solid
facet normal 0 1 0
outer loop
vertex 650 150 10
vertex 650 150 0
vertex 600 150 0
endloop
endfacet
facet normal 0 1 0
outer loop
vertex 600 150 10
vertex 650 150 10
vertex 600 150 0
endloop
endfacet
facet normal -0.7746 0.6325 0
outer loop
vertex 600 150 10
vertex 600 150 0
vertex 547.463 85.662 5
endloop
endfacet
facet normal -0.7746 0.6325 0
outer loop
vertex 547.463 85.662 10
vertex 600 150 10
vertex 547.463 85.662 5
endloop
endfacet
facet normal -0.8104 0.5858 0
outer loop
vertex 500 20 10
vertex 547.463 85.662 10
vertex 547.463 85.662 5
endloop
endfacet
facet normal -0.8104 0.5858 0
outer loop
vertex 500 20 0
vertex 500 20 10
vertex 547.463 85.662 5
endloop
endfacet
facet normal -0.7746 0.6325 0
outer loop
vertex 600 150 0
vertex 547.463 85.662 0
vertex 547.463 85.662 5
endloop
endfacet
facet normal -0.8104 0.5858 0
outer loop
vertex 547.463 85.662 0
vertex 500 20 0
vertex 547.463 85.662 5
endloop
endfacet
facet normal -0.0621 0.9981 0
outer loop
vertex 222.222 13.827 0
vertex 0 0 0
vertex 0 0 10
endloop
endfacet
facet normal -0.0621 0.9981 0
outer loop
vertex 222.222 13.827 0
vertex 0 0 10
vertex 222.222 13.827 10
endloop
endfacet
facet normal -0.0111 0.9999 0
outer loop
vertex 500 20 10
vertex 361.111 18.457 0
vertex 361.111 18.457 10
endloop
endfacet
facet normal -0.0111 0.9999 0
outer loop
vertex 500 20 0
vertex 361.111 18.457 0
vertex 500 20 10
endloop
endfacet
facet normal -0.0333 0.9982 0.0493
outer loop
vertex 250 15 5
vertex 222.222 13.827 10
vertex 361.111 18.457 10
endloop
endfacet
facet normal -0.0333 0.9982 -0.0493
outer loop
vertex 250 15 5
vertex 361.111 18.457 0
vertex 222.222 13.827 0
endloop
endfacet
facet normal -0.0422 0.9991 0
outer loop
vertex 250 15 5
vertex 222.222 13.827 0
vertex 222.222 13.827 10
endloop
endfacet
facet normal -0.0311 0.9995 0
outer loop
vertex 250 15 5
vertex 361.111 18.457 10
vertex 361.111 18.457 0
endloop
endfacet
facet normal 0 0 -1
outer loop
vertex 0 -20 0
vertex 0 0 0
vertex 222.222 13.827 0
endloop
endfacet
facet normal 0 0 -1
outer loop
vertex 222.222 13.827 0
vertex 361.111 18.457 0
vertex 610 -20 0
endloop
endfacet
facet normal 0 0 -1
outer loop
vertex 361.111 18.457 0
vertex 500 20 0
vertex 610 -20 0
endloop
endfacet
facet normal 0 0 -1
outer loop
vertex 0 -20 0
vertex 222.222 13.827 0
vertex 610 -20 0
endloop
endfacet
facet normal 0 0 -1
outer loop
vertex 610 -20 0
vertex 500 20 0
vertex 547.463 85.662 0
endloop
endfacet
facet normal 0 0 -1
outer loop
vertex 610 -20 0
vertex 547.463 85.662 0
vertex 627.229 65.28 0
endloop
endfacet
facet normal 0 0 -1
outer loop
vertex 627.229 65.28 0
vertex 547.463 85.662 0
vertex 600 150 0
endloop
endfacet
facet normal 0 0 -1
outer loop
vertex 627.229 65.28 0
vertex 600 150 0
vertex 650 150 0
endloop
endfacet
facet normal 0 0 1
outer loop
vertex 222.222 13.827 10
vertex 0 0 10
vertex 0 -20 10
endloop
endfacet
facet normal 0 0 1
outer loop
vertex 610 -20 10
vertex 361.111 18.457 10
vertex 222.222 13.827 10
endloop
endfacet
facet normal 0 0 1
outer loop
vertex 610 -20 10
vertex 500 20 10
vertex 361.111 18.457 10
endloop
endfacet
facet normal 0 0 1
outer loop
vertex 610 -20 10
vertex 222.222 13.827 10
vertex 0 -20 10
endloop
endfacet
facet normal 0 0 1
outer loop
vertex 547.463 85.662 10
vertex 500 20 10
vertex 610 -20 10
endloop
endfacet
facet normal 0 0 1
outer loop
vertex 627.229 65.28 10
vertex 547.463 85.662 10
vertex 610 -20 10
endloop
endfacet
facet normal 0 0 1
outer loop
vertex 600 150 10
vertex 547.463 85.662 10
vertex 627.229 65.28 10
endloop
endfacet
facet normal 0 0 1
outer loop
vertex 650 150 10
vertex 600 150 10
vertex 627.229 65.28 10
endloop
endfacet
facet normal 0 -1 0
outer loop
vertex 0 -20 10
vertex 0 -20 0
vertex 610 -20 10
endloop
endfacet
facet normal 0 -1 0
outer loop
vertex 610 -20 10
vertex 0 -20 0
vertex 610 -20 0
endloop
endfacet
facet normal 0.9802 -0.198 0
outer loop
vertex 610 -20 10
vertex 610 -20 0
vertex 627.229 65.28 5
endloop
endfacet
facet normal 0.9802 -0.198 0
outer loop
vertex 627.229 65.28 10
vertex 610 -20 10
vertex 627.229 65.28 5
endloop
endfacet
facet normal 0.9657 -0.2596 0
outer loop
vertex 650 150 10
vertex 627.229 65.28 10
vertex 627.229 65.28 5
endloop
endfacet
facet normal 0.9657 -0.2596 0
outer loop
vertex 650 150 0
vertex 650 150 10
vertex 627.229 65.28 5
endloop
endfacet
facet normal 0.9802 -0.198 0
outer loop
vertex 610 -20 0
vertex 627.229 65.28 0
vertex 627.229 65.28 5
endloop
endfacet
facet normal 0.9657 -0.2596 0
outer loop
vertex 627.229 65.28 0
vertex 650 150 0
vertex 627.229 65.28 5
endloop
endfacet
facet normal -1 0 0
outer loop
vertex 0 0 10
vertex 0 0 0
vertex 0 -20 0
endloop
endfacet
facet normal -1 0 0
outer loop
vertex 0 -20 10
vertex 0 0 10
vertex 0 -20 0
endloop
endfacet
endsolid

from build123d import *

# Parameters (mm, degrees)
BOSS_EXTRUDE1_DEPTH = 10


with BuildPart() as part:
    # Sketch1 → Boss-Extrude1 (new body)
    with BuildSketch(Plane.XY):
        with BuildLine():
            Line((0, 0), (0, -20))
            Line((0, -20), (610, -20))
            add(Edge.make_bspline(
                [(610, -20), (624.457520828, 65.560799572), (650, 150)],
                knots=[0, 0, 0, 1, 1, 1], degree=2))
            Line((650, 150), (600, 150))
            add(Edge.make_bspline(
                [(600, 150), (544.925349806, 86.324000125), (500, 20.000000001)],
                knots=[0, 0, 0, 1, 1, 1], degree=2))
            add(Edge.make_bspline(
                [(0, 0), (250, 20), (500, 20.000000001)],
                knots=[0.083156312, 0.083156312, 0.083156312, 0.916650574, 0.916650574, 0.916650574], degree=2))
        make_face()
    extrude(amount=BOSS_EXTRUDE1_DEPTH)


solid = part.part
